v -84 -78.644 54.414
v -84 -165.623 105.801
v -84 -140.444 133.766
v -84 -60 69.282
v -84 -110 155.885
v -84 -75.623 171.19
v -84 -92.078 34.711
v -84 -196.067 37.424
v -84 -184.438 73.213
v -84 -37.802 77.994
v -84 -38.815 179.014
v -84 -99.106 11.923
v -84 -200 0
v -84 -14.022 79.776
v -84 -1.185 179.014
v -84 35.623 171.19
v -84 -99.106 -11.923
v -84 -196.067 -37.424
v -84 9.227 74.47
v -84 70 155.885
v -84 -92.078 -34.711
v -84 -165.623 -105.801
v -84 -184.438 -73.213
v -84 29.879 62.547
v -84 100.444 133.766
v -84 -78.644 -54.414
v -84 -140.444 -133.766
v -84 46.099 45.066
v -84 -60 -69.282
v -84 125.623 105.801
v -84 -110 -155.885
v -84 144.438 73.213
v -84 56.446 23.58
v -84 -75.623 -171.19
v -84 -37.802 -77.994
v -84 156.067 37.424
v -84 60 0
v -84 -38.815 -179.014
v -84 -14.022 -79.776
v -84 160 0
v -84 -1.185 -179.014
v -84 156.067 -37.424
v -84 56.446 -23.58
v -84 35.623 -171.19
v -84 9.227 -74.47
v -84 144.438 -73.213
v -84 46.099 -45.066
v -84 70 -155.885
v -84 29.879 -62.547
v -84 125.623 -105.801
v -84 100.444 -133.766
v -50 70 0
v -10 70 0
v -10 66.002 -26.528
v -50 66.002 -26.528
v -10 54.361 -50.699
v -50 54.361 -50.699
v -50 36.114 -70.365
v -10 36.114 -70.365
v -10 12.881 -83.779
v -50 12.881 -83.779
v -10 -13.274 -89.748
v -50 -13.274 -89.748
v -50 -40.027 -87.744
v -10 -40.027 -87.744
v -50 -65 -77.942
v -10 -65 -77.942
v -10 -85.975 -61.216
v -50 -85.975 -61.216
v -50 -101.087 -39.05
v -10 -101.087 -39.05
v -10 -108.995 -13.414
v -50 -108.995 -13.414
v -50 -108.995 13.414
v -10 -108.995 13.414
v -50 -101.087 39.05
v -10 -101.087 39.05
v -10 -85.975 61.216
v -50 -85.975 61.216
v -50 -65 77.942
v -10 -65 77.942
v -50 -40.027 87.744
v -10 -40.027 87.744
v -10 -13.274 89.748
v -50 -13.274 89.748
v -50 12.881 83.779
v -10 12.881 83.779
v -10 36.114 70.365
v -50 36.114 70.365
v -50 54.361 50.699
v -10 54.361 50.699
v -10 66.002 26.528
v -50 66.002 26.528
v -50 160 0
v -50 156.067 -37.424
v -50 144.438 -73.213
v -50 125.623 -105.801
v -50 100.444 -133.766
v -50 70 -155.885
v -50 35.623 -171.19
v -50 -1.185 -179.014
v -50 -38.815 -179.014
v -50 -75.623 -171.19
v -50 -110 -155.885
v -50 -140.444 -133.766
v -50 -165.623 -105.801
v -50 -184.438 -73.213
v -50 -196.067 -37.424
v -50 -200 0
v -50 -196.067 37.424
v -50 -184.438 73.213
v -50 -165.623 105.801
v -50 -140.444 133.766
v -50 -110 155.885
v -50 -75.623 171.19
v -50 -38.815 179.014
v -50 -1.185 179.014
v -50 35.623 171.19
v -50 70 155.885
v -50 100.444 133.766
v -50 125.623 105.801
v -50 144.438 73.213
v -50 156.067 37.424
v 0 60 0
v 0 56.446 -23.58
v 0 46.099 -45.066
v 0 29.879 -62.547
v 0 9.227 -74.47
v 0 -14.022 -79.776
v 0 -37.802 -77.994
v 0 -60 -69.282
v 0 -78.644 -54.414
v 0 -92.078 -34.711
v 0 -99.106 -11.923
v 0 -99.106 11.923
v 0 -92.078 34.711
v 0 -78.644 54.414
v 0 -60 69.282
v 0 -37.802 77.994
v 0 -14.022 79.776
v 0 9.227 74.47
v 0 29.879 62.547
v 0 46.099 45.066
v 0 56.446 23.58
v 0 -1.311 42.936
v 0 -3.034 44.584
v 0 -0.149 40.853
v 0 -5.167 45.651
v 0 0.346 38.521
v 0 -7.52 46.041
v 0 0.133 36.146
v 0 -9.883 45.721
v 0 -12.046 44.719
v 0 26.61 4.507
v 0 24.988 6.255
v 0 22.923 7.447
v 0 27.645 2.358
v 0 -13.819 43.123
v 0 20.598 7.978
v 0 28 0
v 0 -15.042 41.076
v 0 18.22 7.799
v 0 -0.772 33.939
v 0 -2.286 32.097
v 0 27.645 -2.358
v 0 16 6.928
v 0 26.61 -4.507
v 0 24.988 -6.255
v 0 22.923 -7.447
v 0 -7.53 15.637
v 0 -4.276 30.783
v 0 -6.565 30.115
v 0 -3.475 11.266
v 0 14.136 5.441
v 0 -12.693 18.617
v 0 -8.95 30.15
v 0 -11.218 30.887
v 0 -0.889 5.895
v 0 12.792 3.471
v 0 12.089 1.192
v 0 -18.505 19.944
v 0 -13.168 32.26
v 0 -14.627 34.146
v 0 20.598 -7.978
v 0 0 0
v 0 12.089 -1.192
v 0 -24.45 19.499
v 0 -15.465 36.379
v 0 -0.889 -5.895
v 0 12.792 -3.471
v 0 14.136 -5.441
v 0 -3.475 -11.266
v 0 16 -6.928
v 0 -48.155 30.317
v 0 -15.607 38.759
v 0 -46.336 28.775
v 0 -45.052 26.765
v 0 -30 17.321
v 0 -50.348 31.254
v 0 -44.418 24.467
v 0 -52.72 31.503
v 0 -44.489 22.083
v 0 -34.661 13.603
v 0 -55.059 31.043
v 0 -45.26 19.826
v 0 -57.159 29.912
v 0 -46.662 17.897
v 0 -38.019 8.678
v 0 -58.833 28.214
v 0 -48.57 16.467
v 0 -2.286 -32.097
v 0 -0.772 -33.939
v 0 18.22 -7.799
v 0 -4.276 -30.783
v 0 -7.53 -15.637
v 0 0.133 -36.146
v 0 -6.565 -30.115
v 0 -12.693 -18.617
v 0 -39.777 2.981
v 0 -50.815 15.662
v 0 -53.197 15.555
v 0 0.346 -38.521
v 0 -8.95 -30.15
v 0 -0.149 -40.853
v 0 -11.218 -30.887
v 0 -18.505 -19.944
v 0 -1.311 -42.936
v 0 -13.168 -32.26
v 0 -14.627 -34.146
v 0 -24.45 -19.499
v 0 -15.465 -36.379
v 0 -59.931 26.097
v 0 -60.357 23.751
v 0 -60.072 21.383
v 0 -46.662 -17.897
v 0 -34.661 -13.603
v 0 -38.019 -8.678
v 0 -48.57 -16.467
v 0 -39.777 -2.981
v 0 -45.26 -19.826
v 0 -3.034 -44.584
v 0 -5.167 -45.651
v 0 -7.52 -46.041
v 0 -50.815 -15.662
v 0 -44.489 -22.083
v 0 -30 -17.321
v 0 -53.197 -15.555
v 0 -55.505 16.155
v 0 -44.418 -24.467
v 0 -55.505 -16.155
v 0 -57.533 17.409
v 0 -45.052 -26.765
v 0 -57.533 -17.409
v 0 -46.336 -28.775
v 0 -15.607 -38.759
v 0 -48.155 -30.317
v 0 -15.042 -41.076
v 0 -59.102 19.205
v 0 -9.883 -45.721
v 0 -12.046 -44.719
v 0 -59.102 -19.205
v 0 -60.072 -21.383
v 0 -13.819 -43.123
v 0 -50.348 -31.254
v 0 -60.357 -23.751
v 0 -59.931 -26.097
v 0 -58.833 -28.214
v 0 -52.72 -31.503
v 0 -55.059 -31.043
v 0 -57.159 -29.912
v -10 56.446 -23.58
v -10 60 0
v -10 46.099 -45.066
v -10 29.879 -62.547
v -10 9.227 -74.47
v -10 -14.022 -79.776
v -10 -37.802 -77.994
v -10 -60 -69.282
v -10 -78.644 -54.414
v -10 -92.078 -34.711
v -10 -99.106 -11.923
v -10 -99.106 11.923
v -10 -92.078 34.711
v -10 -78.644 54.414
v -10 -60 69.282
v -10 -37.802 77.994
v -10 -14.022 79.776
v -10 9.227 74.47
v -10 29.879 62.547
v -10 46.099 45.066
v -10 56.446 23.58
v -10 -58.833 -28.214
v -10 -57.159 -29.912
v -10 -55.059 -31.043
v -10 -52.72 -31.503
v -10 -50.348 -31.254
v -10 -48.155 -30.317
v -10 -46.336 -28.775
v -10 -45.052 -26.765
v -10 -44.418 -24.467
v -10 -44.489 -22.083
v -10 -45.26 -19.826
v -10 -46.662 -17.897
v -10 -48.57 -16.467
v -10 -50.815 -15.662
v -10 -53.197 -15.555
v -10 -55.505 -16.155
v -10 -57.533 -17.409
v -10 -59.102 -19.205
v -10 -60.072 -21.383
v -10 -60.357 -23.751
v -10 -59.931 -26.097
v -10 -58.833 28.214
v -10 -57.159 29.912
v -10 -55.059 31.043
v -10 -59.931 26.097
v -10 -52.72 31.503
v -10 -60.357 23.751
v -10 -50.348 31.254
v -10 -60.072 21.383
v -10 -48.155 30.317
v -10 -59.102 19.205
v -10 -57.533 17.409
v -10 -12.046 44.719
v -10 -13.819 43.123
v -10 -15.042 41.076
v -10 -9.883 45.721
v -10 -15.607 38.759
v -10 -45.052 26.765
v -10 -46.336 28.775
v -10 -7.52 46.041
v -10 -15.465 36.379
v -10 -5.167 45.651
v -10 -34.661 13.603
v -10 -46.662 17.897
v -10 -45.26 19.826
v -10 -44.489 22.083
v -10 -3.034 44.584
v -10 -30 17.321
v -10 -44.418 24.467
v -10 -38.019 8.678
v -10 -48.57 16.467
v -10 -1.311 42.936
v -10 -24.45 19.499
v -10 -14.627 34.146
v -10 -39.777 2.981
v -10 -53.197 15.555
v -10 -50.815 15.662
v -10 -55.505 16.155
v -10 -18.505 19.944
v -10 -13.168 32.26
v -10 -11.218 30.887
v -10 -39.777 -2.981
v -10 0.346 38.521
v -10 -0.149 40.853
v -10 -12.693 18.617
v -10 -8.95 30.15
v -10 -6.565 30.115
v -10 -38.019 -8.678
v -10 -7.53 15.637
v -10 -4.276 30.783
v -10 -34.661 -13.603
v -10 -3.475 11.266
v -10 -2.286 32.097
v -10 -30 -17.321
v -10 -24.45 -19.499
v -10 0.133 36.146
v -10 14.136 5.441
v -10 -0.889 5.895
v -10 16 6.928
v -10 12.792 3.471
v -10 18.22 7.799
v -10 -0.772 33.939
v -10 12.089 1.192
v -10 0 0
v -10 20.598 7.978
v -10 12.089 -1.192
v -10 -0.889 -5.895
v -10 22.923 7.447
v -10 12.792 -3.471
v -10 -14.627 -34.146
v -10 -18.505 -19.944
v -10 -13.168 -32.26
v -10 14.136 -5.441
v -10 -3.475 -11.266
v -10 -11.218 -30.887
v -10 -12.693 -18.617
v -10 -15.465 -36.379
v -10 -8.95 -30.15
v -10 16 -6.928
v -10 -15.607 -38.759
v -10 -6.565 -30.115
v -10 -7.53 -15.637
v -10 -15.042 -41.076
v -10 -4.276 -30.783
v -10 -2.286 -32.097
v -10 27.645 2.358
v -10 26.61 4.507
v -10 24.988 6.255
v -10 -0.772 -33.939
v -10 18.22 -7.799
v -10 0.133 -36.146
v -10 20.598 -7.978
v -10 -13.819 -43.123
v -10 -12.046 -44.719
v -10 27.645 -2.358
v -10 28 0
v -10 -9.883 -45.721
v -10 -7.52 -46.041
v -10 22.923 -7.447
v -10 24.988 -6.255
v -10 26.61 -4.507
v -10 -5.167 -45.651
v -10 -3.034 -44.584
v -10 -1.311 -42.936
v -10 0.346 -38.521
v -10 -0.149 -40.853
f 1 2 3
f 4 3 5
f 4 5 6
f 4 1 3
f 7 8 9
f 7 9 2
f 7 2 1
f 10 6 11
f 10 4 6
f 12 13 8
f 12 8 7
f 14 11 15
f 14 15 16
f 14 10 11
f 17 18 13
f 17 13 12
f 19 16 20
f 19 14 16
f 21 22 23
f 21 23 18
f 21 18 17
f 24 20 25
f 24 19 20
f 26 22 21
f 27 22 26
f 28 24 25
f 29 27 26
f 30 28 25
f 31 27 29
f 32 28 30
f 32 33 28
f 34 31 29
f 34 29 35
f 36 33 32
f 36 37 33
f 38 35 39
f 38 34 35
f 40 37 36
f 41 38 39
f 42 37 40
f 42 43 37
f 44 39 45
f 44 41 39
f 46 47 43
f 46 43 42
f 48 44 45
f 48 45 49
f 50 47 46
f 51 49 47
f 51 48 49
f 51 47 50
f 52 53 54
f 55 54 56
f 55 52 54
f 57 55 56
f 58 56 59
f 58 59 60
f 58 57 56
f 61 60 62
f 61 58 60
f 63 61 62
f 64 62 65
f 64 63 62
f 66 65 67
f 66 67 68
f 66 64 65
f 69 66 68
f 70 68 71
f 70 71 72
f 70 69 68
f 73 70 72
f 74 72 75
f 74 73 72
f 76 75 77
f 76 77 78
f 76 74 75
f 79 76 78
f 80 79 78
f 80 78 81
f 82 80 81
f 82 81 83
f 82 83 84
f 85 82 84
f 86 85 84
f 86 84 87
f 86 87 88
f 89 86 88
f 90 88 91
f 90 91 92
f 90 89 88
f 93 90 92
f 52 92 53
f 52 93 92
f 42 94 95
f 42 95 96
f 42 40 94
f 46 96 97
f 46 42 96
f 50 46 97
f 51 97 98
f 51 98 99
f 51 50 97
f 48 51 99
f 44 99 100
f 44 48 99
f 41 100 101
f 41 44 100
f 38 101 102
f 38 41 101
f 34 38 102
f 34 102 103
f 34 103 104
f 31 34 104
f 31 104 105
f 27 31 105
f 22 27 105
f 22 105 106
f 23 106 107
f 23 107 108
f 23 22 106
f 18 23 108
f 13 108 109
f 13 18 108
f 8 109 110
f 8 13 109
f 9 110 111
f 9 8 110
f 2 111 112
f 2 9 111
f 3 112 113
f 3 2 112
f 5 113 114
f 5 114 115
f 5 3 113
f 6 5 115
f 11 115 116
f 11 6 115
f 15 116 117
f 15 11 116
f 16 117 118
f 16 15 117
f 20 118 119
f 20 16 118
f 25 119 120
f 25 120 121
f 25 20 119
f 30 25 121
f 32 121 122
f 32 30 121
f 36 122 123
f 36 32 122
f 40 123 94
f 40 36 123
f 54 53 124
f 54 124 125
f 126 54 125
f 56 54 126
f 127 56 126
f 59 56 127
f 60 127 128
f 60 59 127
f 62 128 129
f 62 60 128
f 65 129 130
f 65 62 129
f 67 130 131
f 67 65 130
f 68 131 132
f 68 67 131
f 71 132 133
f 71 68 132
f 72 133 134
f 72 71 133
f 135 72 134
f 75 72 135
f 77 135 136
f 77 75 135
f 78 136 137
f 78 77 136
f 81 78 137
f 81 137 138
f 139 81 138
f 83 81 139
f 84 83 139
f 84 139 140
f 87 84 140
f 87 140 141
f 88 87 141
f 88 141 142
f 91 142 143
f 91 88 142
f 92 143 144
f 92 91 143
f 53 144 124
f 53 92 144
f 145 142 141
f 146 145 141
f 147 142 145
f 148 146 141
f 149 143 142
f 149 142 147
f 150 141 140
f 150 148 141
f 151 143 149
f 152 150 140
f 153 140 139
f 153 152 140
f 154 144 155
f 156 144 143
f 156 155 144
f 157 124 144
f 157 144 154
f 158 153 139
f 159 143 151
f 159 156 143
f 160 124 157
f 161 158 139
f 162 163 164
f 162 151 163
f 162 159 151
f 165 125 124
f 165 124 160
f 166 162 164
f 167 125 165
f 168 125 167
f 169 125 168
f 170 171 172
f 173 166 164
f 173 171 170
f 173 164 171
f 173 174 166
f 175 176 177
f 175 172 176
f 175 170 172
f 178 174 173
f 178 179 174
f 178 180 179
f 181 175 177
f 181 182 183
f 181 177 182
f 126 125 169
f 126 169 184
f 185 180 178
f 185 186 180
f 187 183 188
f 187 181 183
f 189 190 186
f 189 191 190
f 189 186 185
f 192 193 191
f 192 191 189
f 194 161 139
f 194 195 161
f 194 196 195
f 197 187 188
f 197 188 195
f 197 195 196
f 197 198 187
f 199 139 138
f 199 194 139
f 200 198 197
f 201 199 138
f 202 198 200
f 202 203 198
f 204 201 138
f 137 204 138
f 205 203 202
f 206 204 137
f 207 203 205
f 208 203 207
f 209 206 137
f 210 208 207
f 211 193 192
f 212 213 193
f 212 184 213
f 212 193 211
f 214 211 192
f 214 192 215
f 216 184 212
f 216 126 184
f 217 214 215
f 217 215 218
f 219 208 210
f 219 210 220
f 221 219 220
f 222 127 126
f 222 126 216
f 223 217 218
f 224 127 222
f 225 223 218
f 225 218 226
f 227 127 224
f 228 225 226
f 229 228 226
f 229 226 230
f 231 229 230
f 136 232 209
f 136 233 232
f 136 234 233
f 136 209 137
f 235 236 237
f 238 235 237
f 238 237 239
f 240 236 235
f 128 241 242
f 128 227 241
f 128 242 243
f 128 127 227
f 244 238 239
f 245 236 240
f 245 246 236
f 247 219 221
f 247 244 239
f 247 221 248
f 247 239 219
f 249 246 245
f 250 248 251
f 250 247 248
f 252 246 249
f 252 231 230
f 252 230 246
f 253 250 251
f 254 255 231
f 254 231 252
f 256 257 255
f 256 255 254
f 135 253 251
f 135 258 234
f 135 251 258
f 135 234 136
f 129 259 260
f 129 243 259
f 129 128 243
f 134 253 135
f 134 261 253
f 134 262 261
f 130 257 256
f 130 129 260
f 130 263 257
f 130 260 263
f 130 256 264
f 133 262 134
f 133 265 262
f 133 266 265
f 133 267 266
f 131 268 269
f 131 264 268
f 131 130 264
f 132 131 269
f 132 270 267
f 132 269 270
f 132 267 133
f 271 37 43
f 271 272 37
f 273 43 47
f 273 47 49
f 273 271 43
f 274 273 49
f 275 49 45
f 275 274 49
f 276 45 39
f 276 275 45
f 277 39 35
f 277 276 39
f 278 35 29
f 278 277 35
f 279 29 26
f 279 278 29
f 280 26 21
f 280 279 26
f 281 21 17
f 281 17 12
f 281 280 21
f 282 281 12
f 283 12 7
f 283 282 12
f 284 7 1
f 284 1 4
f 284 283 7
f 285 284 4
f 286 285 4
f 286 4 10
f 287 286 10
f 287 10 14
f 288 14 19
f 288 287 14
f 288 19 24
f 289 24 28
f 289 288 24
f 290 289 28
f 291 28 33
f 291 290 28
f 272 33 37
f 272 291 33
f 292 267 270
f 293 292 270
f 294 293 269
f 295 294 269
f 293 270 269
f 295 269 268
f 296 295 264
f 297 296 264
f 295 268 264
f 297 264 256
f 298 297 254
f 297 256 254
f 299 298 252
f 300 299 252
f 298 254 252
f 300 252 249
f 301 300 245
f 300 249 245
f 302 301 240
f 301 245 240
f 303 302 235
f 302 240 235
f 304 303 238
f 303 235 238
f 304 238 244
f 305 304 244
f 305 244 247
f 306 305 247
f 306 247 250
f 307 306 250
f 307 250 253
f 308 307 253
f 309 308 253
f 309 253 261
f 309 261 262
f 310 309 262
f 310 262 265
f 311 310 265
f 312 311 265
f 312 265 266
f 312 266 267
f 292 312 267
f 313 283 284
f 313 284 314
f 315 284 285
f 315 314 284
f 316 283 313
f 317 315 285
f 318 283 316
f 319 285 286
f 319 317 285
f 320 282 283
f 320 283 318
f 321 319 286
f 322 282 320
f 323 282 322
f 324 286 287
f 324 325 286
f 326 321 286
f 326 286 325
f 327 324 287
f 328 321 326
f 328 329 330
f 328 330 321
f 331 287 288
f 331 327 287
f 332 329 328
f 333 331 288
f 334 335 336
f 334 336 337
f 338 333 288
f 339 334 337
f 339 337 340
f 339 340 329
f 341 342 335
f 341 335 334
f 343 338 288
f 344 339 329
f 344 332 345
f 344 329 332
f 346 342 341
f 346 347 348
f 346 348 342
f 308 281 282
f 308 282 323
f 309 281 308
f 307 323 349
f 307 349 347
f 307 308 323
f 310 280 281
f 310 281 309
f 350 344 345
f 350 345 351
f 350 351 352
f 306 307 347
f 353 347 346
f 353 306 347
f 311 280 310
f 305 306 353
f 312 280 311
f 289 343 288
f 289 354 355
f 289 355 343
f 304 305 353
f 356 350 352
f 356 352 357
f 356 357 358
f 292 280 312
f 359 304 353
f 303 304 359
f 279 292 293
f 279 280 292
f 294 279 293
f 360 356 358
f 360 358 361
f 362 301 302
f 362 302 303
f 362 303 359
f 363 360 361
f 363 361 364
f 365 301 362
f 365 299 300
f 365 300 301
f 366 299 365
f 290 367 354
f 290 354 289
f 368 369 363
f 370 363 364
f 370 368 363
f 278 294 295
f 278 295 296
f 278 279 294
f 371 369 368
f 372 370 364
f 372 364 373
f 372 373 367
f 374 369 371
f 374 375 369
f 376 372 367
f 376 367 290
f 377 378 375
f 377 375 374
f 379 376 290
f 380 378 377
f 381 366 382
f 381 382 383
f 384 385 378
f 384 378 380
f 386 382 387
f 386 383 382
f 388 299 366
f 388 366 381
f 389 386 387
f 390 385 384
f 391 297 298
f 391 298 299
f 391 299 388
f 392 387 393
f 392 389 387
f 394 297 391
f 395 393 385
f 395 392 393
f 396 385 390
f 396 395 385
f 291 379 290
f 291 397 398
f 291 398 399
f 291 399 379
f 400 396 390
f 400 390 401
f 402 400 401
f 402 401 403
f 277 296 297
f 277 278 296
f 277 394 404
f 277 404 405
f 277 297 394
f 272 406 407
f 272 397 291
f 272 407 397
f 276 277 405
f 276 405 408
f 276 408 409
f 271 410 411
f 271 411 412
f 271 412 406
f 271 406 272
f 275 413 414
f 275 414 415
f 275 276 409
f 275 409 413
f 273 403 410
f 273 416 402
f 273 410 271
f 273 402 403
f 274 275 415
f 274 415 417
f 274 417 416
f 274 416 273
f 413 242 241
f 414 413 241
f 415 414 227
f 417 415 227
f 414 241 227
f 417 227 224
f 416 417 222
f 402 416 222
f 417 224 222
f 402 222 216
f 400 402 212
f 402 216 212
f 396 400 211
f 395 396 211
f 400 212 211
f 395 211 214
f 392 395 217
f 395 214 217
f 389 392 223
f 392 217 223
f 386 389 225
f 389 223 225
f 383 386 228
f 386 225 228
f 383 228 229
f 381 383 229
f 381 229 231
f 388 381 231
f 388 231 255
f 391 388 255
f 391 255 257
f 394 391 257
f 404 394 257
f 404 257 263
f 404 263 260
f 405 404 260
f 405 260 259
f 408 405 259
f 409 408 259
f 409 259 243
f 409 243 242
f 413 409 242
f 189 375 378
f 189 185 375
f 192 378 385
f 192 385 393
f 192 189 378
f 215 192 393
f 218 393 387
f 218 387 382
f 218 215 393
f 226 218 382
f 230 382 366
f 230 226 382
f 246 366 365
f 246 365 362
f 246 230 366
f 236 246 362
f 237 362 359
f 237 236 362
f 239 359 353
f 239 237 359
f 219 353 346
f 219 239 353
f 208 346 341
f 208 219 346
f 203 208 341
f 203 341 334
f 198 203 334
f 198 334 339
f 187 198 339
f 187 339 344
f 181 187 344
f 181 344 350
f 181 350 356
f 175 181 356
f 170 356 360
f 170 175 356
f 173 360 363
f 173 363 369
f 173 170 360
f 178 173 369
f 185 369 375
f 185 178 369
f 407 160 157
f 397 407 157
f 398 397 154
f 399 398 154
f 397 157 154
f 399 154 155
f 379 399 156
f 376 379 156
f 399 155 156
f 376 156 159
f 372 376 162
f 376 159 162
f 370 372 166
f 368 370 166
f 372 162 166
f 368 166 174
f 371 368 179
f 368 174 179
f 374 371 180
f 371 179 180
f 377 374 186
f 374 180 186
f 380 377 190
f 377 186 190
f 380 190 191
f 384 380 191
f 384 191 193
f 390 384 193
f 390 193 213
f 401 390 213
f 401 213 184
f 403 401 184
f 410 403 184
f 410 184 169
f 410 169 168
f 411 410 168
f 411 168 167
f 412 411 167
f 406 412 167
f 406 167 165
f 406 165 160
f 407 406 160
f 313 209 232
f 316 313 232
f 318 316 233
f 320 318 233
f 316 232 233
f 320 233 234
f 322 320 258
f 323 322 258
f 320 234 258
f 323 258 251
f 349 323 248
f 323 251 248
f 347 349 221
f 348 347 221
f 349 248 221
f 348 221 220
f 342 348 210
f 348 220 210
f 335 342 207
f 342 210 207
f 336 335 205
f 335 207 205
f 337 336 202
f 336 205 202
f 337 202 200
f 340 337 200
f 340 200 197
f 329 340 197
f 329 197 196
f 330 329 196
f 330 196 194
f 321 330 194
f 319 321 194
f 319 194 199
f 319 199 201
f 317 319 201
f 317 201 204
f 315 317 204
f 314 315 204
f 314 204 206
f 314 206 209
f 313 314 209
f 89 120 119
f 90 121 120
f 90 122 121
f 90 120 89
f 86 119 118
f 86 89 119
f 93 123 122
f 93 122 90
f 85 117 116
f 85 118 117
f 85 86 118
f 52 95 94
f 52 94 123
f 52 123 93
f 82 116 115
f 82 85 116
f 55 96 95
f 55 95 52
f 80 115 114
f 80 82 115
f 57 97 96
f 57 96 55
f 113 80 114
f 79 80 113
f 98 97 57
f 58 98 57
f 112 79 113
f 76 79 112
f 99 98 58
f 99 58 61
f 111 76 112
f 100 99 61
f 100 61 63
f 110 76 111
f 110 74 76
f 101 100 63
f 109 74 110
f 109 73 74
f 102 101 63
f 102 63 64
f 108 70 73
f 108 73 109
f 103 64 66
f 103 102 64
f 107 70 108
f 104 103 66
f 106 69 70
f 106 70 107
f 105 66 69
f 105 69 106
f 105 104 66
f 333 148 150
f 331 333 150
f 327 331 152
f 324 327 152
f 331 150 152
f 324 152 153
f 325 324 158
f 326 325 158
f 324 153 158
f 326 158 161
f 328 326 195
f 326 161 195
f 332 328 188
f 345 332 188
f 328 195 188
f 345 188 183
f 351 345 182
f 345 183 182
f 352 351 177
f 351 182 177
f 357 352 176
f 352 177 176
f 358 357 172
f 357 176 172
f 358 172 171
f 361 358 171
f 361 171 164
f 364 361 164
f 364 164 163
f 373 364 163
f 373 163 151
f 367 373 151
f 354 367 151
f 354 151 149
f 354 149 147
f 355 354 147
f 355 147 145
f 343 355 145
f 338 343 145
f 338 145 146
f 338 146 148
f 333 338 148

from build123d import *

# Parameters (mm, degrees)
SCHIZZO3_R                  = 8
TAGLIO_ESTRUSIONE1_DEPTH    = 282.879406839
RIPETIZIONECIRCOLARE1_COUNT = 5
SMUSSO1_SIZE                = 10


with BuildPart() as part:
    # Schizzo2 → Rivoluzione1 (revolve)
    with BuildSketch(Plane.XY):
        Polygon((0, 0), (0, 70), (-50, 70), (-50, 160), (-84, 160), (-84, 60), (-10, 60), (-10, 0), align=None)
    revolve(axis=Axis((50, -20, 0), (-1, 0, 0)))

    # Schizzo3 → Taglio-Estrusione1 (cut, through all)
    with BuildSketch(Plane(origin=(0, 0, 0), x_dir=(0, 0, -1), z_dir=(1, 0, 0))):
        with Locations(Location((0, 20, 0), (0, 0, 90))):
            Circle(SCHIZZO3_R)
    taglio_estrusione1 = extrude(amount=-TAGLIO_ESTRUSIONE1_DEPTH, mode=Mode.SUBTRACT)

    # RipetizioneCircolare1: Taglio-Estrusione1 ×5 about axis
    ripetizionecircolare1_axis = Axis((0, -20, 0), (1, 0, 0))
    for i in range(1, RIPETIZIONECIRCOLARE1_COUNT):
        add(taglio_estrusione1.rotate(ripetizionecircolare1_axis, i * 360 / RIPETIZIONECIRCOLARE1_COUNT), mode=Mode.SUBTRACT)

    # Smusso1
    smusso1_edges = [part.edges().sort_by_distance(p)[0] for p in [
        (0, -110, 0),
    ]]
    chamfer(smusso1_edges, length=SMUSSO1_SIZE)


solid = part.part
